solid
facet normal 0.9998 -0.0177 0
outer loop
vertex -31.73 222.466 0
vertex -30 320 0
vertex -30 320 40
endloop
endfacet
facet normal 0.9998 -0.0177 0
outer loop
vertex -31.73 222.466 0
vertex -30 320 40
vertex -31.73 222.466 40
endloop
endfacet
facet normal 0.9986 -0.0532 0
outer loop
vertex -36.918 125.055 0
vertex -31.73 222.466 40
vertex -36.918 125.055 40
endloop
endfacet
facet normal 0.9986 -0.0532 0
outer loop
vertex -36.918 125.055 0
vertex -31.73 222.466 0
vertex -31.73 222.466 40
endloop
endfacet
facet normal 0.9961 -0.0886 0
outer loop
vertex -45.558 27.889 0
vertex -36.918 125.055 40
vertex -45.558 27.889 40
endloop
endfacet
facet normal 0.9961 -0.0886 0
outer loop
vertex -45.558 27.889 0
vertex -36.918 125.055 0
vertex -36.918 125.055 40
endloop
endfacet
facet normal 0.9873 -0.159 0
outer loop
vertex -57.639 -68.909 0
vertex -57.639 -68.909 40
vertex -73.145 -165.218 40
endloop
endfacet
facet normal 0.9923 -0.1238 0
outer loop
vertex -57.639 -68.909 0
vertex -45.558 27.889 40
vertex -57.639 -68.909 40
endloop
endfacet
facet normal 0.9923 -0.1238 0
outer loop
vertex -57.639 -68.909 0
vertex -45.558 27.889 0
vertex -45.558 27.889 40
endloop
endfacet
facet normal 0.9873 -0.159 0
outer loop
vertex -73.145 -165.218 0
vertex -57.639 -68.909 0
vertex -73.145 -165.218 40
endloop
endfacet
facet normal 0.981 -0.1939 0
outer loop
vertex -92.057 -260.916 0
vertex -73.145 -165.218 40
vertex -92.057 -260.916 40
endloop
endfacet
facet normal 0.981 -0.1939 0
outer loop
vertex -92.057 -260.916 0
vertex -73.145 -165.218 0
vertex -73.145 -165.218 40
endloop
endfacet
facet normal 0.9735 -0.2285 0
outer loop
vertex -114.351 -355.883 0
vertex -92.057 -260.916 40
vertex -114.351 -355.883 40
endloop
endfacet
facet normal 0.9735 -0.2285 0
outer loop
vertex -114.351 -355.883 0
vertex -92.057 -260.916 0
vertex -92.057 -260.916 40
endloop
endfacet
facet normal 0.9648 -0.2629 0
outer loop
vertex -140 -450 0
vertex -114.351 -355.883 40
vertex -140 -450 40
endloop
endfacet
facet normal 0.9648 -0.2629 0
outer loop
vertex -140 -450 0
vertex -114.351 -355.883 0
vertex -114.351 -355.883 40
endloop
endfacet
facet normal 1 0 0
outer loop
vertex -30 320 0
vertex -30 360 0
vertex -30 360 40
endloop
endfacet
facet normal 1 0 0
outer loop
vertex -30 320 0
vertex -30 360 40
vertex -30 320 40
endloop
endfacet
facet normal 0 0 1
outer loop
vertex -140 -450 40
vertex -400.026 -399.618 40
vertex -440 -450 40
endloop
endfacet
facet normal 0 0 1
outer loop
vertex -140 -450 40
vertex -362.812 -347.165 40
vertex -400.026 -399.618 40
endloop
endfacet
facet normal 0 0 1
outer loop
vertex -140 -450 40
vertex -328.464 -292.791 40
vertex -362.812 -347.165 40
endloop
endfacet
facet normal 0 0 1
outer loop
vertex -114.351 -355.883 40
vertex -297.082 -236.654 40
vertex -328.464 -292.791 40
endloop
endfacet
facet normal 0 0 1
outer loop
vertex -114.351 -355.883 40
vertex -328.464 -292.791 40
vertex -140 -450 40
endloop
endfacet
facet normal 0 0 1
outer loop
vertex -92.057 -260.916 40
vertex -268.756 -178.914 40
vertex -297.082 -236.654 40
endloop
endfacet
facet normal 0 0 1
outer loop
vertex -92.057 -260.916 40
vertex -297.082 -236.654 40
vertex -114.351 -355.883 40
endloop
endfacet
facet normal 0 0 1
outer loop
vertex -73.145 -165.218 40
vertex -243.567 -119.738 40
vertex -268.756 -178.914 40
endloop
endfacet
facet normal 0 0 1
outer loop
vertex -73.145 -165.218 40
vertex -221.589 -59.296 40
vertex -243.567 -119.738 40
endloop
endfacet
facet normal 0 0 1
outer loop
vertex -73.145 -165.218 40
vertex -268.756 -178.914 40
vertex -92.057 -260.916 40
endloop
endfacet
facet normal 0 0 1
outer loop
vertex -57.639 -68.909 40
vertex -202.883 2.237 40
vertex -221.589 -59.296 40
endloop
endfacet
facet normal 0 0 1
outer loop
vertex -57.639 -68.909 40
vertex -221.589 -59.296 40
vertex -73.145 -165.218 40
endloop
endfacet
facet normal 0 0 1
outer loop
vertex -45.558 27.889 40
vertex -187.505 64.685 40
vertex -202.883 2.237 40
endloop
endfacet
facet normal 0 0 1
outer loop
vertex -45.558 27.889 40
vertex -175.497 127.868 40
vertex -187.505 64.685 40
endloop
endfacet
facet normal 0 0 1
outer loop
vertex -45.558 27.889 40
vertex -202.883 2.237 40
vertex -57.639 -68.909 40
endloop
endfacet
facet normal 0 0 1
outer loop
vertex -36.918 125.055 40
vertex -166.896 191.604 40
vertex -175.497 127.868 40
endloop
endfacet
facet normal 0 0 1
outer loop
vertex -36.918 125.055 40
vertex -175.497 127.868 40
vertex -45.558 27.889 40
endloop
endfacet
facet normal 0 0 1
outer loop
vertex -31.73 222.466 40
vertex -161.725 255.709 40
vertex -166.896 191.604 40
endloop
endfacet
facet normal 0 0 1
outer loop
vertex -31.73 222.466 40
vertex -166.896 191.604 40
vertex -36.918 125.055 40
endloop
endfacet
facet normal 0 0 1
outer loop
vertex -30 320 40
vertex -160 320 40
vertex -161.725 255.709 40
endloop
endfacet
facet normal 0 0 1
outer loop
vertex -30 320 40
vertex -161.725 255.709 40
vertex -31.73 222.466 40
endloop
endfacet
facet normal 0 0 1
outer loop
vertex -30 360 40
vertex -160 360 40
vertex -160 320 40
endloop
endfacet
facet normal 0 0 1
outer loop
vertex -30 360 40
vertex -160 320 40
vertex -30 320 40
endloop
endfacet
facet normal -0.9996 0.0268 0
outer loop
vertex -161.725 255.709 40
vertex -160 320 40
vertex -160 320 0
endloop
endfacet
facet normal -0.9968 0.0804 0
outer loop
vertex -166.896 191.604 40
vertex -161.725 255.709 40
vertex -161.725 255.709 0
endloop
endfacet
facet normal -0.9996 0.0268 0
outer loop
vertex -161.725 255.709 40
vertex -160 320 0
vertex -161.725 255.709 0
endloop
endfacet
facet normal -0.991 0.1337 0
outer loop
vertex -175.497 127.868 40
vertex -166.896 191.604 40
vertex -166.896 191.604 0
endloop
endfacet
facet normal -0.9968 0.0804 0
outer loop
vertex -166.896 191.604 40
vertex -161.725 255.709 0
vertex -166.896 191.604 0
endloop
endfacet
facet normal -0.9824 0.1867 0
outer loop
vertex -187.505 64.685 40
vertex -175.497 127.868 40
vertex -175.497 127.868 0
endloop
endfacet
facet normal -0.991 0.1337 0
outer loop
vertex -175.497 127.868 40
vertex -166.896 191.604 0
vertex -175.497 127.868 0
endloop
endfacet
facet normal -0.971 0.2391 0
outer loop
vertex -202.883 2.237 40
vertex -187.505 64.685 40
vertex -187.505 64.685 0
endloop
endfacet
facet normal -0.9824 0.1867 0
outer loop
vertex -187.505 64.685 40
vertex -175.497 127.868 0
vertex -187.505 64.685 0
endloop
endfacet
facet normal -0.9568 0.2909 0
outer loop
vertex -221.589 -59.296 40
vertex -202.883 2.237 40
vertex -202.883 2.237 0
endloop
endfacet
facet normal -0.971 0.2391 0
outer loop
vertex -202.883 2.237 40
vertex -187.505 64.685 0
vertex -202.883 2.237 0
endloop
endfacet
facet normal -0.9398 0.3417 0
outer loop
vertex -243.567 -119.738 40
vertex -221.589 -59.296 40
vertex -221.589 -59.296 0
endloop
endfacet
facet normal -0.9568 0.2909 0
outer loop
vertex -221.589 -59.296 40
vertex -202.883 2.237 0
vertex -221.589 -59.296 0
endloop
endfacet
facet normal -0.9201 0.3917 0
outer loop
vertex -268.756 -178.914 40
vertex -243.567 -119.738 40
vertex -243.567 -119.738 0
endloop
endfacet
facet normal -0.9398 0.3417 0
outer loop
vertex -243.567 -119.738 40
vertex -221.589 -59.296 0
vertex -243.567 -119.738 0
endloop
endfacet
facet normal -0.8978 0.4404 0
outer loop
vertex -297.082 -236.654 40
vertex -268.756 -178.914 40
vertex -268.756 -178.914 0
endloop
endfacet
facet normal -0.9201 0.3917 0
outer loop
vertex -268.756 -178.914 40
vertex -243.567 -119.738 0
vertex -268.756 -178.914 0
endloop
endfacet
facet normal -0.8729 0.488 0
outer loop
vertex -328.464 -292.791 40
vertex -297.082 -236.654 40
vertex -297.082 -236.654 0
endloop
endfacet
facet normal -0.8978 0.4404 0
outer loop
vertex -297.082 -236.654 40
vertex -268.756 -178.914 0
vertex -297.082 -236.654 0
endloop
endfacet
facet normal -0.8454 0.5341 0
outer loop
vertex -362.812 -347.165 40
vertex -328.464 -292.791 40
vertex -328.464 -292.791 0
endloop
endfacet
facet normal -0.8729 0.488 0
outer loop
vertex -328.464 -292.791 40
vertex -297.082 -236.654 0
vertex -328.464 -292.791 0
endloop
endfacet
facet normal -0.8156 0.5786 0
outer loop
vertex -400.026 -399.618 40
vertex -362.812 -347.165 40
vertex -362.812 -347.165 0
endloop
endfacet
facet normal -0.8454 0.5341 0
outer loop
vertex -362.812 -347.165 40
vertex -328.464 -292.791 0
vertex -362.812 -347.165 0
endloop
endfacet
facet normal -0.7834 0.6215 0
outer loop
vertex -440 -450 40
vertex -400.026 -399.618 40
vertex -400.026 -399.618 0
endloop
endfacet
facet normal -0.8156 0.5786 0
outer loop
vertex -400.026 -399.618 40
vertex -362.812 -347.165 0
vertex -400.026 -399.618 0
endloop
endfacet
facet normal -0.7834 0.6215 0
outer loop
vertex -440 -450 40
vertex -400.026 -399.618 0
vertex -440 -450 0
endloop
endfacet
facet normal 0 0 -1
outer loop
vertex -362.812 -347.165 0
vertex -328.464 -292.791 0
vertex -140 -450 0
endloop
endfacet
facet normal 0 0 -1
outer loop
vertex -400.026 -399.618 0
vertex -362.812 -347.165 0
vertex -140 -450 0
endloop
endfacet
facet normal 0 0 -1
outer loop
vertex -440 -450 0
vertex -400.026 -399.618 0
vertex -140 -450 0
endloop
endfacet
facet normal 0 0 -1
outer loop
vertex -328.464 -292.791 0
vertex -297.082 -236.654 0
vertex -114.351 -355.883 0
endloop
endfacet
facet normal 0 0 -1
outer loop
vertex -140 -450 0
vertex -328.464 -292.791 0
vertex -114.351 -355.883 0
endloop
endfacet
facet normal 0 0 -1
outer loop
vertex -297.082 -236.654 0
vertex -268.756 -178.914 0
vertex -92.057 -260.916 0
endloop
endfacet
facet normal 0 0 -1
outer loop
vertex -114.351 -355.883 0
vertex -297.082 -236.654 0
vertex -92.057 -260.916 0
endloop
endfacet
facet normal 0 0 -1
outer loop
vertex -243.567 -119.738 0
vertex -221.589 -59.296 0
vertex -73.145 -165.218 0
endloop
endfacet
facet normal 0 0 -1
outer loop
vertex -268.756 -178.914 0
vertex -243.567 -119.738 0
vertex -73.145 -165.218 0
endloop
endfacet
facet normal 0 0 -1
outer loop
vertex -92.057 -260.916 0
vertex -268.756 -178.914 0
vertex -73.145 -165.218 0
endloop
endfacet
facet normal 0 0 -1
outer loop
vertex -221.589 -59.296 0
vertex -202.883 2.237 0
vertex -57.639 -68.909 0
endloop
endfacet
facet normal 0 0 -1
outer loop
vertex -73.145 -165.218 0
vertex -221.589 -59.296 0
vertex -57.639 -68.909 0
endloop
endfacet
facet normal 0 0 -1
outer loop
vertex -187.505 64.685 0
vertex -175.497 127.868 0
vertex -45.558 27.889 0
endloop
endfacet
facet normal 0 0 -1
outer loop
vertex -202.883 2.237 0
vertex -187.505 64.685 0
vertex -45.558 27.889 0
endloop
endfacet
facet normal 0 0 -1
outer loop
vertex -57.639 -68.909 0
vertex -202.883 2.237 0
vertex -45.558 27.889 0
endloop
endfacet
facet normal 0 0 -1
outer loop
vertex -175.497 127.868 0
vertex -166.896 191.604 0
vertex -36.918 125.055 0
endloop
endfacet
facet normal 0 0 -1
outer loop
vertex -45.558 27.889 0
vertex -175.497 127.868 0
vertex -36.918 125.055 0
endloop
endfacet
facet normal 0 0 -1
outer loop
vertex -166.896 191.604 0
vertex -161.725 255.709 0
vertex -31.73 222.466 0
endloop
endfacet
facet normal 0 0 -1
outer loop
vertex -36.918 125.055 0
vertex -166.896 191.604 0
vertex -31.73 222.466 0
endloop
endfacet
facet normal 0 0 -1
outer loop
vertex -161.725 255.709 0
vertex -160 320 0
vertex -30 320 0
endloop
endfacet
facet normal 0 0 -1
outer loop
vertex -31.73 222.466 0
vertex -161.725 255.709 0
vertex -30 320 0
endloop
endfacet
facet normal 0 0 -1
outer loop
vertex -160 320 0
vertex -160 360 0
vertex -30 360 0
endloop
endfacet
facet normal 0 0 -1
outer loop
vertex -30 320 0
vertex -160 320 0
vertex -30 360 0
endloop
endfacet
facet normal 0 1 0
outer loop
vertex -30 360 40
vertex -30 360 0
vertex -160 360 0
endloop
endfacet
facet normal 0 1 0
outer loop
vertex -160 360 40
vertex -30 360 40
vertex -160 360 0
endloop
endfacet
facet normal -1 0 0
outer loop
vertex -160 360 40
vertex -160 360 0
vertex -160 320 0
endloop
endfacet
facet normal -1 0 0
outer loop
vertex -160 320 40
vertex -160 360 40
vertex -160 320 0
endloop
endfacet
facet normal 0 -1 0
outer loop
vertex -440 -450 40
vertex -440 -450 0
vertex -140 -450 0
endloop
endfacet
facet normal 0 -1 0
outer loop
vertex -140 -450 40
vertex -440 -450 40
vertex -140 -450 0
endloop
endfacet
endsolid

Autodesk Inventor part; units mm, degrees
ref_plane "YZ Plane" through (0, 0, 0) normal (1, 0, 0) x (0, 1, 0)
ref_plane "XZ Plane" through (0, 0, 0) normal (0, 1, 0) x (-1, 0, 0)
ref_plane "XY Plane" through (0, 0, 0) normal (0, 0, 1) x (1, 0, 0)
sketch "Skizze3" plane through (0, 0, 0) normal (0, 0, 1) x (1, 0, 0)
  line L0 (-500, 500) -> (500, 500)
  line L1 (500, 500) -> (500, -500)
  line L2 (500, -500) -> (-500, -500)
  line L3 (-500, -500) -> (-500, 500)
  line L4 (-500, -400) -> (500, -400)
  line L5 (-275, 500) -> (275, 500)
  line L6 (275, 500) -> (275, 320)
  line L7 (275, 320) -> (-275, 320)
  line L8 (-275, 320) -> (-275, 500)
  arc A0 (-275, 320) -> (-400, -400) centre (1736.1, -400) ccw
  arc A1 (400, -400) -> (275, 320) centre (-1736.1, -400) ccw
  line L9 (-160, 320) -> (160, 320)
  line L10 (160, 320) -> (160, 360)
  line L11 (160, 360) -> (-160, 360)
  line L12 (-160, 360) -> (-160, 320)
  line L13 (-440, -450) -> (-140, -450)
  line L14 (90, -450) -> (440, -450)
  line L15 (-30, 360) -> (-30, 320)
  arc A2 (-440, -450) -> (-160, 320) centre (-1358.75, 320) ccw
  arc A3 (-140, -450) -> (-30, 320) centre (-2780, 320) ccw
  arc A4 (-30, 320) -> (90, -450) centre (2500.4167, 320) ccw
  arc A5 (160, 320) -> (440, -450) centre (1358.75, 320) ccw
  line L16 (-160, 360) -> (-440, -450) construction
  line L17 (-160, 360) -> (-146.1239, 400.1416) construction
  line L18 (-30, 360) -> (-146.1239, 400.1416) construction
  line L19 (-30, 360) -> (121.8543, 307.5071) construction
  line L20 (-440, -450) -> (-172.0218, -542.6344) construction
  line L21 (-140, -450) -> (-172.0218, -542.6344) construction
  line L22 (-140, -450) -> (121.8543, 307.5071) construction
  line L23 (-172.9217, 310.595) -> (139.7195, 418.6685) construction
  line L24 (139.7195, 418.6685) -> (440, -450) construction
  line L25 (440, -450) -> (127.3587, -558.0735) construction
  line L26 (127.3587, -558.0735) -> (-172.9217, 310.595) construction
  point P0 (0, 0)
  point P1 (-500, 0)
  point P2 (0, 500)
  point P3 (0, 320)
  point P4 (0, 360)
  dimension "d4" = 1000
  dimension "d5" = 1000
  dimension "d6" = 100
  dimension "d7" = 550
  dimension "d8" = 180
  dimension "d9" = 100
  dimension "d10" = 100
  dimension "d11" = 320
  dimension "d12" = 300
  dimension "d13" = 350
  dimension "d14" = 230
  dimension "d15" = 60
  dimension "d16" = -60
  dimension "d17" = 130
  dimension "d18" = 190
  dimension "d19" = 50
  dimension "d21" = 283.5374
  dimension "d22" = 40
  dimension "d23" = 140
  dimension "d24" = 899.502
  dimension "d25" = 919.1046
  dimension "d26" = 330.7937
extrude "Extrusion6" add sketch "Skizze3" along normal blind 40 contours A2 A0 L4 | L4 A3 L13 A2 | L12 L11 L15 L7 | L7 A3 L4 A0 A2
equation "\"d9\" = d6"
equation "\"d10\" = d6"
properties part number "UA-072-PlatteLinks"
